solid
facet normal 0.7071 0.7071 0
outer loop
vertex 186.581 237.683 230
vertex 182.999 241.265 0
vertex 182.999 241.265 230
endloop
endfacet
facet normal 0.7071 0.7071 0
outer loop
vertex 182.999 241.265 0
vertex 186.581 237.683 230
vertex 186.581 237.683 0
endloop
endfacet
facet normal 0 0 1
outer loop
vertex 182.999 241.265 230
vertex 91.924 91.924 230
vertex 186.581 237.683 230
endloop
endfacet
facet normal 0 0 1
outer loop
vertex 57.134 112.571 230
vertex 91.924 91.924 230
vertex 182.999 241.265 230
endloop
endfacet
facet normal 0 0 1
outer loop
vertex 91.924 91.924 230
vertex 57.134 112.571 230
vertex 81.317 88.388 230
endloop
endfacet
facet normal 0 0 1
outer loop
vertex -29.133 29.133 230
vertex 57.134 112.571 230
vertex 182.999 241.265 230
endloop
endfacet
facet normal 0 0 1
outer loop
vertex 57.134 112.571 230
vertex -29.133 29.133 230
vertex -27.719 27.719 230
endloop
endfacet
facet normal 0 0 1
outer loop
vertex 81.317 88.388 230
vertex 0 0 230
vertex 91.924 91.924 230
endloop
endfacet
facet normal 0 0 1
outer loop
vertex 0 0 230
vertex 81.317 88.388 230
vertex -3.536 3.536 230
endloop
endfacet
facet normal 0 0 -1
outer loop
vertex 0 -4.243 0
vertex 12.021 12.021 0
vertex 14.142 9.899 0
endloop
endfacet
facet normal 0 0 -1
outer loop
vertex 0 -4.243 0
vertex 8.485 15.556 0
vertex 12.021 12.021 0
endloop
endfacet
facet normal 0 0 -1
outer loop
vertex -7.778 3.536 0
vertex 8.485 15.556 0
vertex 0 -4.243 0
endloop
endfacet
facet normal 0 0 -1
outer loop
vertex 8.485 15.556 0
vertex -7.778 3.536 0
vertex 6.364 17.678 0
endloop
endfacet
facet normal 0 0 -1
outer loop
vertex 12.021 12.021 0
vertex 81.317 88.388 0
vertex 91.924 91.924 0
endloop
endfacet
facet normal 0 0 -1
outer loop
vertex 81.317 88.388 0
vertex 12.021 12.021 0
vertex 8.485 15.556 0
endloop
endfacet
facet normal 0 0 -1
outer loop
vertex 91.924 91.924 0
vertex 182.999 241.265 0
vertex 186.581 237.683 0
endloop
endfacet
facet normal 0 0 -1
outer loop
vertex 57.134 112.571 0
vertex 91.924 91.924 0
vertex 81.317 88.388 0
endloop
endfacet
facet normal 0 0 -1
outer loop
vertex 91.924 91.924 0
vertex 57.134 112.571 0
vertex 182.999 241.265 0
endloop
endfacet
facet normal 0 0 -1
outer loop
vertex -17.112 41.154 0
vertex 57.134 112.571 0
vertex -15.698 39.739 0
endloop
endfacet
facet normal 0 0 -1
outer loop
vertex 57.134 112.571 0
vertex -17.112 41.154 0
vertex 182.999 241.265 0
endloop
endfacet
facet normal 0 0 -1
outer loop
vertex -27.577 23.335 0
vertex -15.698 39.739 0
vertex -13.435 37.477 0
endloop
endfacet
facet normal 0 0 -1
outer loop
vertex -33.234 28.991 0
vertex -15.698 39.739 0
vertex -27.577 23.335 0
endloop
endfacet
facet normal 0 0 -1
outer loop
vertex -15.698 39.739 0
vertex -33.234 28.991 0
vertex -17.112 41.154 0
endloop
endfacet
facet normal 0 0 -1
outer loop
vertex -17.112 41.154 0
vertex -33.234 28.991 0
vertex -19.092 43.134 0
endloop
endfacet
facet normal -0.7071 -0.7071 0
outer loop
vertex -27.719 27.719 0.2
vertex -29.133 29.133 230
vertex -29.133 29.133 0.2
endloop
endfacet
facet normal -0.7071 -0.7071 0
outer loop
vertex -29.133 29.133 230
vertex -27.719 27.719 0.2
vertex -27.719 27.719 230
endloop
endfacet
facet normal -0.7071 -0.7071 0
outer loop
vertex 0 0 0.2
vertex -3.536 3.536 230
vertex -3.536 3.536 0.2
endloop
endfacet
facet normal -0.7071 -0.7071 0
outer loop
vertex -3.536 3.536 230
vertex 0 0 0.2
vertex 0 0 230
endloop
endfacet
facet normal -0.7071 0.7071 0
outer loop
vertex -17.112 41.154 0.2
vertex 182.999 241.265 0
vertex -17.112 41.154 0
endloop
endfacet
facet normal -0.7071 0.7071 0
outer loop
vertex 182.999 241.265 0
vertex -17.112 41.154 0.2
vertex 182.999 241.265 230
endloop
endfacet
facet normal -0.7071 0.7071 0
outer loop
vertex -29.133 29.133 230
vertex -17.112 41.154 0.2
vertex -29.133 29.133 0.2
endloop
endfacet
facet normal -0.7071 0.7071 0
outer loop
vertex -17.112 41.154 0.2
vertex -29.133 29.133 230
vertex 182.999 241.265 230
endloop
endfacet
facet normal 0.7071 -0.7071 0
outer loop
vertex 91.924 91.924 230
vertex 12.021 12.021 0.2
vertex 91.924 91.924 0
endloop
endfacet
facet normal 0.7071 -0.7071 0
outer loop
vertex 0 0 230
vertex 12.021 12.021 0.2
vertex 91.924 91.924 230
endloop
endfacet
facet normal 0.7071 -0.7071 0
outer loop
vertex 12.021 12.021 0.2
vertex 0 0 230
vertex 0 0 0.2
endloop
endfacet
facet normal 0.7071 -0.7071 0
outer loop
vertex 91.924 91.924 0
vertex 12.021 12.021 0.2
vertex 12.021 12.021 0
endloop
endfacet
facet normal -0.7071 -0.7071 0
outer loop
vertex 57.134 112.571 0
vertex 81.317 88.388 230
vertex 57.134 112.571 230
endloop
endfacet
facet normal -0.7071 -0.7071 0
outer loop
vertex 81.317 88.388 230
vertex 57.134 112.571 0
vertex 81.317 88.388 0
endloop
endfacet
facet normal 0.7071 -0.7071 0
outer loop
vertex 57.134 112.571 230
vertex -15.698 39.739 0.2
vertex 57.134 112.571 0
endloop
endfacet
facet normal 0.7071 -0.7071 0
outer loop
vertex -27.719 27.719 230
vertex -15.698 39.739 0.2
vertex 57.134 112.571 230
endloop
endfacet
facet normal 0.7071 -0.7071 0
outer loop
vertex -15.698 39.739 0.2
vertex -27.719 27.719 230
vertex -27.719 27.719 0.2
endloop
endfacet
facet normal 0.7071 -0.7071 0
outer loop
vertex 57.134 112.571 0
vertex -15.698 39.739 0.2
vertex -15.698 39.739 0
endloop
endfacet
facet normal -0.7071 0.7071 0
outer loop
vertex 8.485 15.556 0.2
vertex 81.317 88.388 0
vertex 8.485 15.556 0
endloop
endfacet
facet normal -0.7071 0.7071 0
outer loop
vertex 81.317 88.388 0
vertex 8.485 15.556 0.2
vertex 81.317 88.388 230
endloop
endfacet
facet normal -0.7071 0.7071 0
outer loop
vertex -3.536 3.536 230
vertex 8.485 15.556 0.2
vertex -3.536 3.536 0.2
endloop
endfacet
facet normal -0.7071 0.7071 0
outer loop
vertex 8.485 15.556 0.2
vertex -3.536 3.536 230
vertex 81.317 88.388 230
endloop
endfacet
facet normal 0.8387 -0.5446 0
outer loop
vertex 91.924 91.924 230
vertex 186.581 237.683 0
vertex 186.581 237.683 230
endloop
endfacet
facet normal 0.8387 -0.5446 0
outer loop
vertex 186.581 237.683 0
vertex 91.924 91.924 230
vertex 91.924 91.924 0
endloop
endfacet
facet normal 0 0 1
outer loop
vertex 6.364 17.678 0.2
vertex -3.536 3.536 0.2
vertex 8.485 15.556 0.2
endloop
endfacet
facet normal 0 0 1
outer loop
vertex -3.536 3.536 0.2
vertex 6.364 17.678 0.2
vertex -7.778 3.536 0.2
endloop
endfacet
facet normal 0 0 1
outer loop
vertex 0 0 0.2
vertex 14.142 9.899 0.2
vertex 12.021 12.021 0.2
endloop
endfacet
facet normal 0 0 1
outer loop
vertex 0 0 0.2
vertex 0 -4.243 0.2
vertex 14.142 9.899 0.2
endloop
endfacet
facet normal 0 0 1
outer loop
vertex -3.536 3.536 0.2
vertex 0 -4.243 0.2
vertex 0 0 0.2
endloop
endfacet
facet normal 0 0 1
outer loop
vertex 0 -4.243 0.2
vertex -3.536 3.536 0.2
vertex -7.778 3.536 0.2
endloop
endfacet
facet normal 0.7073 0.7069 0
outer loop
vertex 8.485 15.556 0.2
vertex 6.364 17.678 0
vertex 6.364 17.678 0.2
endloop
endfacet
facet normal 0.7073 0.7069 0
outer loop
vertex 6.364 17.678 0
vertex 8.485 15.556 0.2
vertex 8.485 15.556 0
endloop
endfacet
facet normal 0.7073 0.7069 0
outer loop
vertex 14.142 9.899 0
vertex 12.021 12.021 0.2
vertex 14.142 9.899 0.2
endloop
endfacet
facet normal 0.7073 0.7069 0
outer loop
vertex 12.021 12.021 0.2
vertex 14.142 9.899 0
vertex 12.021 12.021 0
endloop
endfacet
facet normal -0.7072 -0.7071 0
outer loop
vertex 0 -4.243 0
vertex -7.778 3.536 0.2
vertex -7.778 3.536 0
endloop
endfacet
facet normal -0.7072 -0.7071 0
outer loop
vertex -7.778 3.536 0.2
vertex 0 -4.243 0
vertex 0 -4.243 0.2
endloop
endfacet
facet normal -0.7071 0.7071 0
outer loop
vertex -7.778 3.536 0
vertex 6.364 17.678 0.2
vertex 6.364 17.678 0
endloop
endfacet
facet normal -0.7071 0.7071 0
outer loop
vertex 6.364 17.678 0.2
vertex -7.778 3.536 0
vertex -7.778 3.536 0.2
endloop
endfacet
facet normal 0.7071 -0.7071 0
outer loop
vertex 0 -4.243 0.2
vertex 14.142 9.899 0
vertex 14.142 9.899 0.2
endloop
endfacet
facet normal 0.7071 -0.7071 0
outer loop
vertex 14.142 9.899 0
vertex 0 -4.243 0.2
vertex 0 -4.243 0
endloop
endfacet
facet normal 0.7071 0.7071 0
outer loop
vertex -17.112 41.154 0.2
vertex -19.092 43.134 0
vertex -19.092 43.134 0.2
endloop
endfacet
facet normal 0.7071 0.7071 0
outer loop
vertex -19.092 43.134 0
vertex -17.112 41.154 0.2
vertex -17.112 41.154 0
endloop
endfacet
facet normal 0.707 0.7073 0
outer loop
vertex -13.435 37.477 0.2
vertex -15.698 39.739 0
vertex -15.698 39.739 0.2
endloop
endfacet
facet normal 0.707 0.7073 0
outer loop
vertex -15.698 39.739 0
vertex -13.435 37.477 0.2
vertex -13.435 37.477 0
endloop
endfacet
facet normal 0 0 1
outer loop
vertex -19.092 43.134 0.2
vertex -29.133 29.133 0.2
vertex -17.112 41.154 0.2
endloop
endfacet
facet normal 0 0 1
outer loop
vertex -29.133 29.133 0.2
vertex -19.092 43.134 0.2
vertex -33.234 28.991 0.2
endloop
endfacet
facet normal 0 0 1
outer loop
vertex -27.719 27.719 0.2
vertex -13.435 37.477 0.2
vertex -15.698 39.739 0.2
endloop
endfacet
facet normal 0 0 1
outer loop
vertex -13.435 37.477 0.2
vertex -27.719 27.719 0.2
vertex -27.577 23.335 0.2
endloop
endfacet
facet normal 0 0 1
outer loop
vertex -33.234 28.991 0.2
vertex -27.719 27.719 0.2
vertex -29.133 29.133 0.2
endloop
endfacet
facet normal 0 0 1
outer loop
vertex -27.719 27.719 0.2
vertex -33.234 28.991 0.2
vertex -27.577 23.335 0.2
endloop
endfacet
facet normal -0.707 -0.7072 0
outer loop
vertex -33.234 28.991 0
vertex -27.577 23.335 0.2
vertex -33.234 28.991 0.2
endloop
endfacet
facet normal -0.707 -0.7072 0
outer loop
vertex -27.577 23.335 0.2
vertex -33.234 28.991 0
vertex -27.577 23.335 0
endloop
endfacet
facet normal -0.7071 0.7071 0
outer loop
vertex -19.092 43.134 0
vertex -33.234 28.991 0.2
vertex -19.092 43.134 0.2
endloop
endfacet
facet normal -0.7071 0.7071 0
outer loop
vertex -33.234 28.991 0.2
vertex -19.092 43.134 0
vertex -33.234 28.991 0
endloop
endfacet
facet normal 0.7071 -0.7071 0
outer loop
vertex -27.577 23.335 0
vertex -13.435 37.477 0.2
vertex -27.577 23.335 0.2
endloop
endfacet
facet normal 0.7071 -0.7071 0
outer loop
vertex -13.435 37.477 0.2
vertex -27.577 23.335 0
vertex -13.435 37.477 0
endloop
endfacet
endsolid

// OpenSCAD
rotate([0,0,45]) {
    difference() {
        cube([300,34.2+7,230]);
        translate([-1,5,-1]) cube([121,34.2,999]);
        translate([130,0,0]) rotate([0,0,-78]) cube([999,999,999]);
        translate([-5,-5,0]) cube([20,15,0.2]);
    }
    translate([-3,-3,0]) cube([20,11,0.2]);
    translate([-3,36,0]) cube([20,8,0.2]);

}
